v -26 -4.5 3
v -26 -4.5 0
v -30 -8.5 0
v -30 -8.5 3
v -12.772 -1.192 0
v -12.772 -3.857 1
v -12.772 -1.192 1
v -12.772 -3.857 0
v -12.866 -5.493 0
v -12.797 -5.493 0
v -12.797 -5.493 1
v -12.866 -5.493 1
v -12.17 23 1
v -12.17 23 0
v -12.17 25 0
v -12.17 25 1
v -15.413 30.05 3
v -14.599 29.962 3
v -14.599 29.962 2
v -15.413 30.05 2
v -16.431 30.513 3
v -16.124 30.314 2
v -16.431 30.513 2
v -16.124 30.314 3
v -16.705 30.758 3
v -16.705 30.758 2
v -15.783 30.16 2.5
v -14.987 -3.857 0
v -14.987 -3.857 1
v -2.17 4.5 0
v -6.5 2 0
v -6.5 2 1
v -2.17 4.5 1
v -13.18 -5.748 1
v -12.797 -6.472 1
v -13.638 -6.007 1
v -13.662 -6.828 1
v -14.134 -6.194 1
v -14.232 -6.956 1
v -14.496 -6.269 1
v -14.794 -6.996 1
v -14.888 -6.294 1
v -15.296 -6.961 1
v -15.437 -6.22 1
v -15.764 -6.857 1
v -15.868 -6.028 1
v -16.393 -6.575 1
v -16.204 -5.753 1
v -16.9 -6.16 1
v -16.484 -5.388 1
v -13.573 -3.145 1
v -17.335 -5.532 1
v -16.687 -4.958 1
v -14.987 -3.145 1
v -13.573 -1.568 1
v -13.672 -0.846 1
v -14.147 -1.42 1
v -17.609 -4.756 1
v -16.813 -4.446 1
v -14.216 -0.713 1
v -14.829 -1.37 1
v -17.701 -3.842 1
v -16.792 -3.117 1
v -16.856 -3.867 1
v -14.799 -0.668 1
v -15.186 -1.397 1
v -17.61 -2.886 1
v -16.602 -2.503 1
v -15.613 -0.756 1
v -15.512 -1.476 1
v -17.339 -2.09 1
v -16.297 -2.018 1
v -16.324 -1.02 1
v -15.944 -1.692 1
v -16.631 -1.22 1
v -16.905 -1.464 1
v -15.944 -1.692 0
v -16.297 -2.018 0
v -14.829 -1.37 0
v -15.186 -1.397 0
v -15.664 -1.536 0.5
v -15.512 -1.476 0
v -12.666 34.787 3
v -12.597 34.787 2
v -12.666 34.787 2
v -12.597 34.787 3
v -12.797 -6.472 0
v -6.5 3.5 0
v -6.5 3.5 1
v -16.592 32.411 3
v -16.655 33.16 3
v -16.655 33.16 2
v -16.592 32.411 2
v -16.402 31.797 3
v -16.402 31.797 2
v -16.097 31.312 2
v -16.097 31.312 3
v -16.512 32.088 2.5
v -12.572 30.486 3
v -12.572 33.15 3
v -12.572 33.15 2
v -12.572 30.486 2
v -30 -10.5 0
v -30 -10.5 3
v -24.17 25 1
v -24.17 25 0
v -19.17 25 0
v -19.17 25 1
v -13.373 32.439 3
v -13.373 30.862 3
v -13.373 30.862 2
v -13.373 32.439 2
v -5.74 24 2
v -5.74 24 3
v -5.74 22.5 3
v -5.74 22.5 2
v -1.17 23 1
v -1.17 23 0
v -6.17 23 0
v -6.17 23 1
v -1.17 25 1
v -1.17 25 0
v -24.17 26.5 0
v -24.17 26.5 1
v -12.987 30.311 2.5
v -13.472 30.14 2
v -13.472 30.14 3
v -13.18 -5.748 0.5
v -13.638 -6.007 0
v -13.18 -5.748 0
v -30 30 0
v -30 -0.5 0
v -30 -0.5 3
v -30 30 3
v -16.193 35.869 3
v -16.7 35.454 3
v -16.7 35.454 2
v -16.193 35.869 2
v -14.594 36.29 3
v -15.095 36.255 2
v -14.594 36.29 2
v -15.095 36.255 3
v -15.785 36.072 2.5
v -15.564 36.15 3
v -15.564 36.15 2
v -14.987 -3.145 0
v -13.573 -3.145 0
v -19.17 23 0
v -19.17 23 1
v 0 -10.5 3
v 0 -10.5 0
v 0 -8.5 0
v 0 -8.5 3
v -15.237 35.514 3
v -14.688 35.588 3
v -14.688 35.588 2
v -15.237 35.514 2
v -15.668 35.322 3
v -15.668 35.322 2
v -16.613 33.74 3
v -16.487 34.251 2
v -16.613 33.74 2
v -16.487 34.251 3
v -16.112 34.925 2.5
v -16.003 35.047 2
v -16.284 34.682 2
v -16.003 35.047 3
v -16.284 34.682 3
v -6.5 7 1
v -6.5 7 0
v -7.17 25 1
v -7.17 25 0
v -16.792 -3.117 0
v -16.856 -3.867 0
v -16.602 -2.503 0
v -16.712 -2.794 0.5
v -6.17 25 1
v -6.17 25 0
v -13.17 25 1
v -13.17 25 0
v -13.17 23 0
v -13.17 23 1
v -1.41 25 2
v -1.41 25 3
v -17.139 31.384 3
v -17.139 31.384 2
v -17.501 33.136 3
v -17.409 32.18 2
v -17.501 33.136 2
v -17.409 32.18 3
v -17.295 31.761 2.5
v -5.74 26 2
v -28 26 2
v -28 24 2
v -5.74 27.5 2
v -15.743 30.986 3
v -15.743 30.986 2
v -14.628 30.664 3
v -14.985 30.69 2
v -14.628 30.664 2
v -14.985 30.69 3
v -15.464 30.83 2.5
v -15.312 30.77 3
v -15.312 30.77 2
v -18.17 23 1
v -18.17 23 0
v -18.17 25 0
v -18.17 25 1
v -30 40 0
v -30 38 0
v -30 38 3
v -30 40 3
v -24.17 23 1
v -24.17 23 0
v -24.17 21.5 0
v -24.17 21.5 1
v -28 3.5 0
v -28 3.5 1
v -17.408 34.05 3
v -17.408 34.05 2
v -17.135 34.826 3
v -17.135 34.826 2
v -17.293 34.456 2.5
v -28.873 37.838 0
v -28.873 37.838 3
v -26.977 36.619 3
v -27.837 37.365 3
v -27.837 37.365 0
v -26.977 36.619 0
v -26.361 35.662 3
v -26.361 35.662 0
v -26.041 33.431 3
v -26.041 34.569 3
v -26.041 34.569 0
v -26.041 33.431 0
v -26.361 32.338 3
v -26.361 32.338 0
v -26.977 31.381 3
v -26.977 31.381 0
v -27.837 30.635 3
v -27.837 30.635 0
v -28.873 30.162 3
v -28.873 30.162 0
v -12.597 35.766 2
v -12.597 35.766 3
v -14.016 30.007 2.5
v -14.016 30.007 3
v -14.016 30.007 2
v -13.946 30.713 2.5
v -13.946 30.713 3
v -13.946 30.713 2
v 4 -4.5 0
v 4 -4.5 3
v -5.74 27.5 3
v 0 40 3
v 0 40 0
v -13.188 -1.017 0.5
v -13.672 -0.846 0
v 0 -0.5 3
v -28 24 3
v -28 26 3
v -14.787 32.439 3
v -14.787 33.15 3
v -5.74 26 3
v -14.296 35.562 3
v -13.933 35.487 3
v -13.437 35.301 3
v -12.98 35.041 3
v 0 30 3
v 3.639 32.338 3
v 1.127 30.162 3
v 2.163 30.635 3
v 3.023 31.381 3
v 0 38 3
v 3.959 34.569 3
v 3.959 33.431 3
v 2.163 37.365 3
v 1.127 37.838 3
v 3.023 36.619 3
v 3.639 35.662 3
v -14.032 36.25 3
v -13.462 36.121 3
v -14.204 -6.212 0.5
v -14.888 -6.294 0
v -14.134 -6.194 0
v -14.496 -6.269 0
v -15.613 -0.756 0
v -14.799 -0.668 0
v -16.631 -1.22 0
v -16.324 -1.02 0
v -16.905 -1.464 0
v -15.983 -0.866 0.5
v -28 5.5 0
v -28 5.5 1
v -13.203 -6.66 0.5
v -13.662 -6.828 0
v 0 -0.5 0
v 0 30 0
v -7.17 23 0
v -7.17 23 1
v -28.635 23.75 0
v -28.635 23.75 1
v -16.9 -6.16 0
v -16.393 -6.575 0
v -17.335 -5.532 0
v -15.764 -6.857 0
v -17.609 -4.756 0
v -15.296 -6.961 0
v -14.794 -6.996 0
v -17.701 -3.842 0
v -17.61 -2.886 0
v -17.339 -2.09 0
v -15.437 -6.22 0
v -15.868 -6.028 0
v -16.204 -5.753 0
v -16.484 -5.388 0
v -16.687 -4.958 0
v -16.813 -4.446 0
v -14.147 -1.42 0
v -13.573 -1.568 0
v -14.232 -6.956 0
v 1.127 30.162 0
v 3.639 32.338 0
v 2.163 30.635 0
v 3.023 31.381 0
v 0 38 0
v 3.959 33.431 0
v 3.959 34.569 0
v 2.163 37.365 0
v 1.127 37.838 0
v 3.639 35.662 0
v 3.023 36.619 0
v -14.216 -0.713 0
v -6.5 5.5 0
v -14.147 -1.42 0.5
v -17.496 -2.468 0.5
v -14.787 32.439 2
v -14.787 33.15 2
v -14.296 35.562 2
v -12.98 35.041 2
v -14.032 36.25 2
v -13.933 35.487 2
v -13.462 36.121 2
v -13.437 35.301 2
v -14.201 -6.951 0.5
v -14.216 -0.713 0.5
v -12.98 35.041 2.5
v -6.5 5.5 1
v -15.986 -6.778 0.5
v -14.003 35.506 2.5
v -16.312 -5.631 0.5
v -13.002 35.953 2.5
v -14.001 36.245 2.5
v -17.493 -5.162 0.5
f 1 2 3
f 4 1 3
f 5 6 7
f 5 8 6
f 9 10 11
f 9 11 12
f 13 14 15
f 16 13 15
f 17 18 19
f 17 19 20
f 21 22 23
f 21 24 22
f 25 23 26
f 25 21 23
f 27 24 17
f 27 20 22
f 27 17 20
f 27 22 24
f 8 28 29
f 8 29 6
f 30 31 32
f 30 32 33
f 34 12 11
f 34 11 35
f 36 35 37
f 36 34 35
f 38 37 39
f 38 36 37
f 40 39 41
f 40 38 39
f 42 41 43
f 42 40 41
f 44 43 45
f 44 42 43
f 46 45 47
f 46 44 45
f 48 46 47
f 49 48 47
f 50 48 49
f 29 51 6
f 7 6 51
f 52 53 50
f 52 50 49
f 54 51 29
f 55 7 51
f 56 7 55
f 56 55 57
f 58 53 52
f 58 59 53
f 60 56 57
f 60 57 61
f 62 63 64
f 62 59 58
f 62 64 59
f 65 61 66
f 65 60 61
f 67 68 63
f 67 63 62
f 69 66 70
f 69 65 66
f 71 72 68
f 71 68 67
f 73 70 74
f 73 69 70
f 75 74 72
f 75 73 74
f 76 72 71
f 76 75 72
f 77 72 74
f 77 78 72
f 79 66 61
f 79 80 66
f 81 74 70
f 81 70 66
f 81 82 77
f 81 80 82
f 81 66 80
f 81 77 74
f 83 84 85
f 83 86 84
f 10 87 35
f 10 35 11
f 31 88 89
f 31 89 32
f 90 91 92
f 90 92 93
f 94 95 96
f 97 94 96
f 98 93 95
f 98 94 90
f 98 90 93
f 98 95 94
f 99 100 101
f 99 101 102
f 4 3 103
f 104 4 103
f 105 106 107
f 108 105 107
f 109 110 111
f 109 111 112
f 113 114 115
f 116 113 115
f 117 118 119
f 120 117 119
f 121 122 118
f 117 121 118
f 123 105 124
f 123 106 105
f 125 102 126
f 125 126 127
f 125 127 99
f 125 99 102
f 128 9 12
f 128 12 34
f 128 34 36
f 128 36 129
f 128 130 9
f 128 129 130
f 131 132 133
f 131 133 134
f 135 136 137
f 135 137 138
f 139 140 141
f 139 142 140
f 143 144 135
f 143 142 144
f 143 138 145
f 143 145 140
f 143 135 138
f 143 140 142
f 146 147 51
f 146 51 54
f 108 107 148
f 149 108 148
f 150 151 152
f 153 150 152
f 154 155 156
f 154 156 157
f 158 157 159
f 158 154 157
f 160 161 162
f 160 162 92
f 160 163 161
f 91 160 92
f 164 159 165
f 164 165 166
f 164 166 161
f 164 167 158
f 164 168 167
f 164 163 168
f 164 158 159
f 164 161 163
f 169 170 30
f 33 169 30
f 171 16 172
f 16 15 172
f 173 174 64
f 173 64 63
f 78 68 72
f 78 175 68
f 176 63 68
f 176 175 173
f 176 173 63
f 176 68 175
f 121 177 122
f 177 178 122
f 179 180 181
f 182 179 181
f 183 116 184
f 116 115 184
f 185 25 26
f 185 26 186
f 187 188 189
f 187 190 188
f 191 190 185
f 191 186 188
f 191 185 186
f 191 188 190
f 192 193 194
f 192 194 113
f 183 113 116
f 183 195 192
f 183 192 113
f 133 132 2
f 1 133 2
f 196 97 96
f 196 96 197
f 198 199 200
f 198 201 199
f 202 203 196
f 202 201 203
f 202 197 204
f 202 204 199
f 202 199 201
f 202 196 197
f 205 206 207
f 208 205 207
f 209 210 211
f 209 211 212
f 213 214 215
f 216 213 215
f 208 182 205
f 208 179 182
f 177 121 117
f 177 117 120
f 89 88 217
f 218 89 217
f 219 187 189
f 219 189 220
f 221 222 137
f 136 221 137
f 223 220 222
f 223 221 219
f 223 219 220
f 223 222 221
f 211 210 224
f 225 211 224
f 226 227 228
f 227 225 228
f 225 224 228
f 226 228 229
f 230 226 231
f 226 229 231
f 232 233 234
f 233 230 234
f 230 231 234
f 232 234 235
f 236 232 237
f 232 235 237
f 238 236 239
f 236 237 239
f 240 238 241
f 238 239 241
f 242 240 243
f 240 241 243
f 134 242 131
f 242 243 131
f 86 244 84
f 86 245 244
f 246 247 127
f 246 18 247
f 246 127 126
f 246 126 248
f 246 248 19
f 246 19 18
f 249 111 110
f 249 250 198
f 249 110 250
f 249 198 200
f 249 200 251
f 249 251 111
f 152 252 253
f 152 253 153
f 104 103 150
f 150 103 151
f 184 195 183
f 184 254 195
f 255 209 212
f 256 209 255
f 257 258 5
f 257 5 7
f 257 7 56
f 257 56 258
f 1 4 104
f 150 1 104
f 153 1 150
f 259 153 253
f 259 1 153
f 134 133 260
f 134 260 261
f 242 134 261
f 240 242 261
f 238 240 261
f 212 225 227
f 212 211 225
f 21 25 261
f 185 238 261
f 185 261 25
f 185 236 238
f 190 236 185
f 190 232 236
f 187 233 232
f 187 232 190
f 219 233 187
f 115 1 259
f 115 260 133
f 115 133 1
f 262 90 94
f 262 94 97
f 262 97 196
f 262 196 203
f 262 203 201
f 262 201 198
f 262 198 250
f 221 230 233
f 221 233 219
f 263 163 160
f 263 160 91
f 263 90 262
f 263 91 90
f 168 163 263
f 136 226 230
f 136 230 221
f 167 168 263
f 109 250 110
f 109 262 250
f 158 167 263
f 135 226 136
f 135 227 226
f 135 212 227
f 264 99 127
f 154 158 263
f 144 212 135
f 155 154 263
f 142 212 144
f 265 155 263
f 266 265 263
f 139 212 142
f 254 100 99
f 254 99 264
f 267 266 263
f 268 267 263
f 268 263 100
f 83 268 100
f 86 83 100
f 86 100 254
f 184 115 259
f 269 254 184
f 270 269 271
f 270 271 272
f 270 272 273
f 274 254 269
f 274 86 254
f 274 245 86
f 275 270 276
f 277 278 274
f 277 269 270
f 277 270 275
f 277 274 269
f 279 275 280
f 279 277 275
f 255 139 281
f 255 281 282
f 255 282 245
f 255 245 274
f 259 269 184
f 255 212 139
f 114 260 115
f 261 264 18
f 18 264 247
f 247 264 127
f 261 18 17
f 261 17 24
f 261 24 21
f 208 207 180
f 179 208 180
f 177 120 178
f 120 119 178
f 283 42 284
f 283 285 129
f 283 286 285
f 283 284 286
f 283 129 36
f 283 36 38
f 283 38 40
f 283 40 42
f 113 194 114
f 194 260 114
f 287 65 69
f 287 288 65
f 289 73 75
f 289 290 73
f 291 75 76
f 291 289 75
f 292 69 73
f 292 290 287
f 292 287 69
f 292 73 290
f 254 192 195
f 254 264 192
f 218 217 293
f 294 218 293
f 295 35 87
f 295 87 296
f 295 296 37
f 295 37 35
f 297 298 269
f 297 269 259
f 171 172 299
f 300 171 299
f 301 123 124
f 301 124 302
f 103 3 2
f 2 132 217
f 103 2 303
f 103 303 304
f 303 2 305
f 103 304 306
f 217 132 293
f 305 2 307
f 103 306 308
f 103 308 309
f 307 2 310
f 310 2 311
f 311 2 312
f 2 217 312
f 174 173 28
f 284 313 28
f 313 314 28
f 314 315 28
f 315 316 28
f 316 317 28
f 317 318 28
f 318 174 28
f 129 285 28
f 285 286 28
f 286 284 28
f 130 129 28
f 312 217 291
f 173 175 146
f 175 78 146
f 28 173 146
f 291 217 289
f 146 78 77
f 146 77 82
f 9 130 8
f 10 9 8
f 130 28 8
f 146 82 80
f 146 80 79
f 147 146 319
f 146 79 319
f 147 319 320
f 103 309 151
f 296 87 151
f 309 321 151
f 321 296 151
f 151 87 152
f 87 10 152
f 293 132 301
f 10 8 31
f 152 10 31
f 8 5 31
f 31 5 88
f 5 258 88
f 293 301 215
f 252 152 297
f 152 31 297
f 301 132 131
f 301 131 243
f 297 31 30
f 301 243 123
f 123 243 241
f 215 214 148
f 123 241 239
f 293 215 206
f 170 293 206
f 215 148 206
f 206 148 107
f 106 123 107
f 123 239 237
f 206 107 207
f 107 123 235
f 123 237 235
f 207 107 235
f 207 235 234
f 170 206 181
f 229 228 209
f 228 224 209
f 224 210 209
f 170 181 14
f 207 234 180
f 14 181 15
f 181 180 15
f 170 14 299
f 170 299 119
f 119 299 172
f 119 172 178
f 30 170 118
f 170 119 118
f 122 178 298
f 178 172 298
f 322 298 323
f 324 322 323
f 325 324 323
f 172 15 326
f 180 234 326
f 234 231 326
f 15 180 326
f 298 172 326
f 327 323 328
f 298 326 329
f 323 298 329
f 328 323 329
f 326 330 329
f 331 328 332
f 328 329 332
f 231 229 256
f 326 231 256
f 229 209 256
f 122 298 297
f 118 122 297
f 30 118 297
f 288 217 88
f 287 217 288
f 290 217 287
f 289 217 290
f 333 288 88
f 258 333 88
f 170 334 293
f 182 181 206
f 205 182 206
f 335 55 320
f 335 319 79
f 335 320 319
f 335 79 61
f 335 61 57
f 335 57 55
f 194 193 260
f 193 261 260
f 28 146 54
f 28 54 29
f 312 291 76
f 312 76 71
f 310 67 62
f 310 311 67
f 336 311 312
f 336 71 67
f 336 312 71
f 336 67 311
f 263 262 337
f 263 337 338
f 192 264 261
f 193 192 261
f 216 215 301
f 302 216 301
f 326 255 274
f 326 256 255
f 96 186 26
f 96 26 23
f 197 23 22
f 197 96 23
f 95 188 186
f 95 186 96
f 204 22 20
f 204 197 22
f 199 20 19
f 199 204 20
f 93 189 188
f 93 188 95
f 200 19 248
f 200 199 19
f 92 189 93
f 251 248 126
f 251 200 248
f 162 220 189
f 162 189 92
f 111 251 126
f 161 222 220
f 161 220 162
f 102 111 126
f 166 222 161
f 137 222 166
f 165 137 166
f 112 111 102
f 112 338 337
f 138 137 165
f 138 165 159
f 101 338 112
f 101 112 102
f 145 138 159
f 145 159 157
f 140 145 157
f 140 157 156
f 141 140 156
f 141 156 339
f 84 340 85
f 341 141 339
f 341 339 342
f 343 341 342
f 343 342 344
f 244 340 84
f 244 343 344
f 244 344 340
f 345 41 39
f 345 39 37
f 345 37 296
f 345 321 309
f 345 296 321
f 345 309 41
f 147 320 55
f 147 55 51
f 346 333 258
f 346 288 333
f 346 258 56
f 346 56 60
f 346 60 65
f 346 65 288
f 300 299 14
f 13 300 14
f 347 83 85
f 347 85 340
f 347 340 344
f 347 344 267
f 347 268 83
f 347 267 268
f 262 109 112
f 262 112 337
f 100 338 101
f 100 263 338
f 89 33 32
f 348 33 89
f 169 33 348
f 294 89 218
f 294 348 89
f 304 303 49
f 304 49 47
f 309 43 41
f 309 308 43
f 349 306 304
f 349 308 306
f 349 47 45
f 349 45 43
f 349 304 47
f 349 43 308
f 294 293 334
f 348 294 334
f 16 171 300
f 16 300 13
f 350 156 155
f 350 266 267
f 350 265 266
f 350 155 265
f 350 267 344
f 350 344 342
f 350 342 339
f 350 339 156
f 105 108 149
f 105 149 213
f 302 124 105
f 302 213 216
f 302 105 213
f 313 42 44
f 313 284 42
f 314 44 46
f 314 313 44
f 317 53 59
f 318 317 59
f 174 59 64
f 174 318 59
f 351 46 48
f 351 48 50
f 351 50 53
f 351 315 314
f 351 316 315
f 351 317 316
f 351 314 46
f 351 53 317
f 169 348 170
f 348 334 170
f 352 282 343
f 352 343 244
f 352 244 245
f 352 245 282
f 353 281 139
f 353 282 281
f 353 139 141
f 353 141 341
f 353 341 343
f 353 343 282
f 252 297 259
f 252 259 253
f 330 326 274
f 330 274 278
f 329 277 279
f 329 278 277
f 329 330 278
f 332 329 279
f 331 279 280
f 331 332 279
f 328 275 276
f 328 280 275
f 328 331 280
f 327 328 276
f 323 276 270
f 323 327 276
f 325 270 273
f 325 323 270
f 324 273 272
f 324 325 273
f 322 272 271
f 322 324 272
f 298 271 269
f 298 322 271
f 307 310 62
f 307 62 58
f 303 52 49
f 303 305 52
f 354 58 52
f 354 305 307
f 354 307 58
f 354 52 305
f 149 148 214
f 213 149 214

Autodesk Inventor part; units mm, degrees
ref_plane "YZ Plane" through (0, 0, 0) normal (1, 0, 0) x (0, 1, 0)
ref_plane "XZ Plane" through (0, 0, 0) normal (0, 1, 0) x (-1, 0, 0)
ref_plane "XY Plane" through (0, 0, 0) normal (0, 0, 1) x (1, 0, 0)
sketch "Sketch1" plane through (0, 0, 0) normal (0, 0, 1) x (1, 0, 0)
  line L0 (-30, 40) -> (0, 40)
  line L1 (-36.1318, 34) -> (13.8682, 34) construction
  arc A0 (0, 30) -> (0, 38) centre (0, 34) ccw
  arc A1 (-30, 30) -> (-30, 38) centre (-30, 34) ccw
  line L2 (-30, 30) -> (0, 30) construction
  line L3 (-30, 0) -> (-30, -4.5) construction
  line L4 (-30, -4.5) -> (0, -4.5) construction
  line L5 (0, -4.5) -> (0, 0) construction
  circle A2 centre (-30, -4.5) radius 4 construction
  circle A3 centre (0, -4.5) radius 4 construction
  line L6 (-30, 0) -> (-30, 30)
  line L7 (-30, 38) -> (-30, 40)
  line L8 (0, 40) -> (0, 38)
  line L9 (0, 30) -> (0, 0)
  line L10 (-30, 0.0688) -> (-30, -0.5)
  line L11 (-30, -0.5) -> (-26, -4.5)
  line L12 (0, 0) -> (0, -0.5)
  line L13 (0, -0.5) -> (4, -4.5)
  line L14 (4, -4.5) -> (0, -8.5)
  line L15 (-26, -4.5) -> (-30, -8.5)
  line L16 (-30, -8.5) -> (-30, -10.5)
  line L17 (-30, -10.5) -> (0, -10.5)
  line L18 (0, -10.5) -> (0, -8.5)
  line L19 (0, 0) -> (-0.5, 0)
  dimension "d0" = 30
  dimension "d1" = 40
  dimension "d2" = 50
  dimension "d3" = 6
  dimension "d4" = 8
  dimension "d5" = 8
  dimension "d6" = 4.5
  dimension "d7" = 8
  dimension "d8" = 8
  dimension "d9" = 2
extrude "Extrusion1" add sketch "Sketch1" along normal blind 3
sketch "Sketch2" plane through (0, 0, 3) normal (0, 0, 1) x (1, 0, 0)
  line L0 (-30, -10.5) -> (0, -10.5) construction
  line L1 (0, -0.5) -> (0, 30) construction
  line L2 (0, 40) -> (-30, 40) construction
  line L3 (-15, 40) -> (-15, -10.5) construction
  line L4 (-15, 40) -> (-15, 36.5) construction
  line L5 (-15, 36.5) -> (-8.9843, 36.5) construction
  line L6 (-17.7725, 36.2895) -> (-9.6231, 36.2895) construction
  line L7 (-9.6231, 36.2895) -> (-9.6231, 27.3992) construction
  line L8 (-9.6231, 27.3992) -> (-17.7725, 27.3992) construction
  line L9 (-17.7725, 27.3992) -> (-17.7725, 36.2895) construction
  line L10 (-15, -10.5) -> (-15, 26) construction
  line L11 (-15, 26) -> (0, 26) construction
  line L12 (-5.7398, 26) -> (-28, 26)
  line L13 (-28, 26) -> (-28, 24)
  line L14 (-28, 24) -> (-5.7398, 24)
  line L15 (-5.7398, 24) -> (-5.7398, 26)
  line L16 (-28, 25) -> (0, 25) construction
  line L17 (-5.7398, 26) -> (-5.7398, 27.5)
  line L18 (-5.7398, 27.5) -> (-1.4096, 25)
  line L19 (-5.7398, 24) -> (-5.7398, 22.5)
  line L20 (-5.7398, 22.5) -> (-1.4096, 25)
  spline S0 degree 2 poles (-14.5989, 29.9621) (-15.2464, 29.9621) (-16.3191, 30.3575) (-16.7047, 30.7579) knots 0 0 0 1 2 2 2
  spline S1 degree 2 poles (-16.7047, 30.7579) (-17.0903, 31.1633) (-17.5006, 32.3596) (-17.5006, 33.1357) knots 0 0 0 1 2 2 2
  spline S2 degree 2 poles (-17.5006, 33.1357) (-17.5006, 33.8722) (-17.0853, 35.0388) (-16.6998, 35.4541) knots 0 0 0 1 2 2 2
  spline S3 degree 2 poles (-16.6998, 35.4541) (-16.329, 35.8545) (-15.2415, 36.2895) (-14.5939, 36.2895) knots 0 0 0 1 2 2 2
  spline S4 degree 2 poles (-14.5939, 36.2895) (-14.2825, 36.2895) (-13.719, 36.2005) (-13.4619, 36.1214) knots 0 0 0 1 2 2 2
  spline S5 degree 2 poles (-13.4619, 36.1214) (-13.2543, 36.0621) (-12.7501, 35.8446) (-12.5969, 35.7655) knots 0 0 0 1 2 2 2
  line L21 (-12.5969, 35.7655) -> (-12.5969, 34.7867)
  line L22 (-12.5969, 34.7867) -> (-12.6661, 34.7867)
  spline S6 degree 2 poles (-12.6661, 34.7867) (-12.8193, 34.9202) (-13.1406, 35.1624) (-13.4372, 35.3008) knots 0 0 0 1 2 2 2
  spline S7 degree 2 poles (-13.4372, 35.3008) (-13.6844, 35.4244) (-14.3221, 35.5875) (-14.6879, 35.5875) knots 0 0 0 1 2 2 2
  spline S8 degree 2 poles (-14.6879, 35.5875) (-15.5678, 35.5875) (-16.6553, 34.2627) (-16.6553, 33.1604) knots 0 0 0 1 2 2 2
  spline S9 degree 2 poles (-16.6553, 33.1604) (-16.6553, 32.5474) (-16.3686, 31.628) (-16.0967, 31.3116) knots 0 0 0 1 2 2 2
  spline S10 degree 2 poles (-16.0967, 31.3116) (-15.8347, 30.9952) (-15.0932, 30.664) (-14.6285, 30.664) knots 0 0 0 1 2 2 2
  spline S11 degree 2 poles (-14.6285, 30.664) (-14.2875, 30.664) (-13.6053, 30.7629) (-13.3729, 30.8618) knots 0 0 0 1 2 2 2
  line L23 (-13.3729, 30.8618) -> (-13.3729, 32.4387)
  line L24 (-13.3729, 32.4387) -> (-14.7867, 32.4387)
  line L25 (-14.7867, 32.4387) -> (-14.7867, 33.1505)
  line L26 (-14.7867, 33.1505) -> (-12.5721, 33.1505)
  line L27 (-12.5721, 33.1505) -> (-12.5721, 30.4861)
  spline S12 degree 2 poles (-12.5721, 30.4861) (-12.7254, 30.4169) (-13.2494, 30.2043) (-13.4718, 30.14) knots 0 0 0 1 2 2 2
  spline S13 degree 2 poles (-13.4718, 30.14) (-13.7734, 30.0511) (-14.2578, 29.9621) (-14.5989, 29.9621) knots 0 0 0 1 2 2 2
  point P0 (0, 0)
  dimension "d12" = 3.5
  dimension "d13" = 36.5
  dimension "d14" = 2
  dimension "d15" = 1.5
  dimension "d16" = 5
  dimension "d17" = 1.5
  dimension "d58" = 14
extrude "Extrusion2" cut sketch "Sketch2" against normal blind 1
sketch "Sketch5" plane through (0, 0, 0) normal (0, 0, -1) x (-1, 0, 0)
  line L0 (30, 30) -> (30, -0.5) construction
  arc A0 (30, 38) -> (30, 30) centre (30, 34) ccw construction
  line L1 (30, 40) -> (30, 38) construction
  line L2 (0, 40) -> (30, 40) construction
  line L3 (0, 38) -> (0, 40) construction
  arc A1 (0, 38) -> (0, 30) centre (0, 34) ccw construction
  line L4 (0, -0.5) -> (0, 30) construction
  line L5 (-4, -4.5) -> (0, -0.5) construction
  line L6 (0, -8.5) -> (-4, -4.5) construction
  line L7 (0, -10.5) -> (0, -8.5) construction
  line L8 (30, -10.5) -> (0, -10.5) construction
  line L9 (30, -8.5) -> (30, -10.5) construction
  line L10 (26, -4.5) -> (30, -8.5) construction
  line L11 (30, -0.5) -> (26, -4.5) construction
  point P0 (0, 0)
sketch "Sketch6" plane through (0, 0, 0) normal (0, 0, -1) x (-1, 0, 0)
  line L0 (30, 30) -> (30, -0.5) construction
  line L1 (0, 40) -> (30, 40) construction
  line L2 (30, -10.5) -> (0, -10.5) construction
  line L3 (17.9728, -6.9957) -> (10.1851, -6.9957) construction
  line L4 (10.1851, -6.9957) -> (10.1851, 2.1518) construction
  line L5 (10.1851, 2.1518) -> (17.9728, 2.1518) construction
  line L6 (17.9728, 2.1518) -> (17.9728, -6.9957) construction
  line L7 (15, -10.5) -> (15, 40) construction
  line L8 (15, -10.5) -> (15, -7) construction
  line L9 (15, -7) -> (11.2598, -7) construction
  line L10 (16.564, 40) -> (16.564, 4) construction
  line L11 (16.564, 4) -> (24.4907, 4) construction
  line L12 (30, 5.5) -> (28, 5.5) construction
  line L13 (28, 5.5) -> (6.5, 5.5)
  line L14 (6.5, 5.5) -> (6.5, 3.5)
  line L15 (6.5, 3.5) -> (28, 3.5)
  line L16 (28, 3.5) -> (28, 5.5)
  line L17 (6.5, 3.5) -> (6.5, 2)
  line L18 (6.5, 2) -> (2.1699, 4.5)
  line L19 (6.5, 5.5) -> (6.5, 7)
  line L20 (6.5, 7) -> (2.1699, 4.5)
  line L21 (5.7398, 24) -> (28, 24) construction
  line L22 (28, 26) -> (5.7398, 26) construction
  line L23 (1.1699, 23) -> (6.1699, 23)
  line L24 (6.1699, 23) -> (6.1699, 25)
  line L25 (6.1699, 25) -> (1.1699, 25)
  line L26 (1.1699, 25) -> (1.1699, 23)
  line L27 (7.1699, 23) -> (12.1699, 23)
  line L28 (12.1699, 25) -> (7.1699, 25)
  line L29 (12.1699, 23) -> (12.1699, 25)
  line L30 (7.1699, 25) -> (7.1699, 23)
  line L31 (13.1699, 23) -> (18.1699, 23)
  line L32 (18.1699, 25) -> (13.1699, 25)
  line L33 (18.1699, 23) -> (18.1699, 25)
  line L34 (13.1699, 25) -> (13.1699, 23)
  line L35 (19.1699, 23) -> (24.1699, 23)
  line L36 (24.1699, 25) -> (19.1699, 25)
  line L37 (24.1699, 23) -> (24.1699, 25)
  line L38 (19.1699, 25) -> (19.1699, 23)
  line L39 (24.1699, 23) -> (24.1699, 21.5)
  line L40 (24.1699, 21.5) -> (28.635, 23.75)
  line L41 (24.1699, 25) -> (24.1699, 26.5)
  line L42 (24.1699, 26.5) -> (28.635, 23.75)
  line L43 (0, -0.5) -> (0, 30) construction
  line L44 (28, 4.5) -> (0, 4.5) construction
  spline S0 degree 2 poles (14.7992, -0.6683) (15.4468, -0.6683) (16.5195, -1.0638) (16.9051, -1.4642) knots 0 0 0 1 2 2 2
  spline S1 degree 2 poles (16.9051, -1.4642) (17.2906, -1.8695) (17.7009, -3.0658) (17.7009, -3.8419) knots 0 0 0 1 2 2 2
  spline S2 degree 2 poles (17.7009, -3.8419) (17.7009, -4.5784) (17.2857, -5.745) (16.9001, -6.1603) knots 0 0 0 1 2 2 2
  spline S3 degree 2 poles (16.9001, -6.1603) (16.5294, -6.5607) (15.4419, -6.9957) (14.7943, -6.9957) knots 0 0 0 1 2 2 2
  spline S4 degree 2 poles (14.7943, -6.9957) (14.4829, -6.9957) (13.9193, -6.9067) (13.6623, -6.8276) knots 0 0 0 1 2 2 2
  spline S5 degree 2 poles (13.6623, -6.8276) (13.4547, -6.7683) (12.9505, -6.5508) (12.7972, -6.4717) knots 0 0 0 1 2 2 2
  line L45 (12.7972, -6.4717) -> (12.7972, -5.4929)
  line L46 (12.7972, -5.4929) -> (12.8664, -5.4929)
  spline S6 degree 2 poles (12.8664, -5.4929) (13.0197, -5.6264) (13.341, -5.8686) (13.6376, -6.007) knots 0 0 0 1 2 2 2
  spline S7 degree 2 poles (13.6376, -6.007) (13.8847, -6.1306) (14.5224, -6.2937) (14.8882, -6.2937) knots 0 0 0 1 2 2 2
  spline S8 degree 2 poles (14.8882, -6.2937) (15.7681, -6.2937) (16.8556, -4.9689) (16.8556, -3.8666) knots 0 0 0 1 2 2 2
  spline S9 degree 2 poles (16.8556, -3.8666) (16.8556, -3.2536) (16.5689, -2.3342) (16.2971, -2.0178) knots 0 0 0 1 2 2 2
  spline S10 degree 2 poles (16.2971, -2.0178) (16.0351, -1.7014) (15.2936, -1.3702) (14.8289, -1.3702) knots 0 0 0 1 2 2 2
  spline S11 degree 2 poles (14.8289, -1.3702) (14.4878, -1.3702) (13.8056, -1.4691) (13.5733, -1.568) knots 0 0 0 1 2 2 2
  line L47 (13.5733, -1.568) -> (13.5733, -3.1449)
  line L48 (13.5733, -3.1449) -> (14.9871, -3.1449)
  line L49 (14.9871, -3.1449) -> (14.9871, -3.8567)
  line L50 (14.9871, -3.8567) -> (12.7725, -3.8567)
  line L51 (12.7725, -3.8567) -> (12.7725, -1.1923)
  spline S12 degree 2 poles (12.7725, -1.1923) (12.9257, -1.1231) (13.4497, -0.9105) (13.6722, -0.8462) knots 0 0 0 1 2 2 2
  spline S13 degree 2 poles (13.6722, -0.8462) (13.9737, -0.7573) (14.4582, -0.6683) (14.7992, -0.6683) knots 0 0 0 1 2 2 2
  point P0 (0, 0)
  dimension "d36" = 3.5
  dimension "d37" = 36
  dimension "d38" = 2
  dimension "d39" = 1.5
  dimension "d40" = 5
  dimension "d41" = 1.5
  dimension "d42" = 5
  dimension "d43" = 2
  dimension "d46" = 6
  dimension "d51" = 1.5
  dimension "d52" = 5
  dimension "d53" = 1.5
  dimension "d56" = 18.5
  dimension "d57" = 14
extrude "Extrusion4" cut sketch "Sketch6" against normal blind 1
properties part number "MS_G[202] text"
